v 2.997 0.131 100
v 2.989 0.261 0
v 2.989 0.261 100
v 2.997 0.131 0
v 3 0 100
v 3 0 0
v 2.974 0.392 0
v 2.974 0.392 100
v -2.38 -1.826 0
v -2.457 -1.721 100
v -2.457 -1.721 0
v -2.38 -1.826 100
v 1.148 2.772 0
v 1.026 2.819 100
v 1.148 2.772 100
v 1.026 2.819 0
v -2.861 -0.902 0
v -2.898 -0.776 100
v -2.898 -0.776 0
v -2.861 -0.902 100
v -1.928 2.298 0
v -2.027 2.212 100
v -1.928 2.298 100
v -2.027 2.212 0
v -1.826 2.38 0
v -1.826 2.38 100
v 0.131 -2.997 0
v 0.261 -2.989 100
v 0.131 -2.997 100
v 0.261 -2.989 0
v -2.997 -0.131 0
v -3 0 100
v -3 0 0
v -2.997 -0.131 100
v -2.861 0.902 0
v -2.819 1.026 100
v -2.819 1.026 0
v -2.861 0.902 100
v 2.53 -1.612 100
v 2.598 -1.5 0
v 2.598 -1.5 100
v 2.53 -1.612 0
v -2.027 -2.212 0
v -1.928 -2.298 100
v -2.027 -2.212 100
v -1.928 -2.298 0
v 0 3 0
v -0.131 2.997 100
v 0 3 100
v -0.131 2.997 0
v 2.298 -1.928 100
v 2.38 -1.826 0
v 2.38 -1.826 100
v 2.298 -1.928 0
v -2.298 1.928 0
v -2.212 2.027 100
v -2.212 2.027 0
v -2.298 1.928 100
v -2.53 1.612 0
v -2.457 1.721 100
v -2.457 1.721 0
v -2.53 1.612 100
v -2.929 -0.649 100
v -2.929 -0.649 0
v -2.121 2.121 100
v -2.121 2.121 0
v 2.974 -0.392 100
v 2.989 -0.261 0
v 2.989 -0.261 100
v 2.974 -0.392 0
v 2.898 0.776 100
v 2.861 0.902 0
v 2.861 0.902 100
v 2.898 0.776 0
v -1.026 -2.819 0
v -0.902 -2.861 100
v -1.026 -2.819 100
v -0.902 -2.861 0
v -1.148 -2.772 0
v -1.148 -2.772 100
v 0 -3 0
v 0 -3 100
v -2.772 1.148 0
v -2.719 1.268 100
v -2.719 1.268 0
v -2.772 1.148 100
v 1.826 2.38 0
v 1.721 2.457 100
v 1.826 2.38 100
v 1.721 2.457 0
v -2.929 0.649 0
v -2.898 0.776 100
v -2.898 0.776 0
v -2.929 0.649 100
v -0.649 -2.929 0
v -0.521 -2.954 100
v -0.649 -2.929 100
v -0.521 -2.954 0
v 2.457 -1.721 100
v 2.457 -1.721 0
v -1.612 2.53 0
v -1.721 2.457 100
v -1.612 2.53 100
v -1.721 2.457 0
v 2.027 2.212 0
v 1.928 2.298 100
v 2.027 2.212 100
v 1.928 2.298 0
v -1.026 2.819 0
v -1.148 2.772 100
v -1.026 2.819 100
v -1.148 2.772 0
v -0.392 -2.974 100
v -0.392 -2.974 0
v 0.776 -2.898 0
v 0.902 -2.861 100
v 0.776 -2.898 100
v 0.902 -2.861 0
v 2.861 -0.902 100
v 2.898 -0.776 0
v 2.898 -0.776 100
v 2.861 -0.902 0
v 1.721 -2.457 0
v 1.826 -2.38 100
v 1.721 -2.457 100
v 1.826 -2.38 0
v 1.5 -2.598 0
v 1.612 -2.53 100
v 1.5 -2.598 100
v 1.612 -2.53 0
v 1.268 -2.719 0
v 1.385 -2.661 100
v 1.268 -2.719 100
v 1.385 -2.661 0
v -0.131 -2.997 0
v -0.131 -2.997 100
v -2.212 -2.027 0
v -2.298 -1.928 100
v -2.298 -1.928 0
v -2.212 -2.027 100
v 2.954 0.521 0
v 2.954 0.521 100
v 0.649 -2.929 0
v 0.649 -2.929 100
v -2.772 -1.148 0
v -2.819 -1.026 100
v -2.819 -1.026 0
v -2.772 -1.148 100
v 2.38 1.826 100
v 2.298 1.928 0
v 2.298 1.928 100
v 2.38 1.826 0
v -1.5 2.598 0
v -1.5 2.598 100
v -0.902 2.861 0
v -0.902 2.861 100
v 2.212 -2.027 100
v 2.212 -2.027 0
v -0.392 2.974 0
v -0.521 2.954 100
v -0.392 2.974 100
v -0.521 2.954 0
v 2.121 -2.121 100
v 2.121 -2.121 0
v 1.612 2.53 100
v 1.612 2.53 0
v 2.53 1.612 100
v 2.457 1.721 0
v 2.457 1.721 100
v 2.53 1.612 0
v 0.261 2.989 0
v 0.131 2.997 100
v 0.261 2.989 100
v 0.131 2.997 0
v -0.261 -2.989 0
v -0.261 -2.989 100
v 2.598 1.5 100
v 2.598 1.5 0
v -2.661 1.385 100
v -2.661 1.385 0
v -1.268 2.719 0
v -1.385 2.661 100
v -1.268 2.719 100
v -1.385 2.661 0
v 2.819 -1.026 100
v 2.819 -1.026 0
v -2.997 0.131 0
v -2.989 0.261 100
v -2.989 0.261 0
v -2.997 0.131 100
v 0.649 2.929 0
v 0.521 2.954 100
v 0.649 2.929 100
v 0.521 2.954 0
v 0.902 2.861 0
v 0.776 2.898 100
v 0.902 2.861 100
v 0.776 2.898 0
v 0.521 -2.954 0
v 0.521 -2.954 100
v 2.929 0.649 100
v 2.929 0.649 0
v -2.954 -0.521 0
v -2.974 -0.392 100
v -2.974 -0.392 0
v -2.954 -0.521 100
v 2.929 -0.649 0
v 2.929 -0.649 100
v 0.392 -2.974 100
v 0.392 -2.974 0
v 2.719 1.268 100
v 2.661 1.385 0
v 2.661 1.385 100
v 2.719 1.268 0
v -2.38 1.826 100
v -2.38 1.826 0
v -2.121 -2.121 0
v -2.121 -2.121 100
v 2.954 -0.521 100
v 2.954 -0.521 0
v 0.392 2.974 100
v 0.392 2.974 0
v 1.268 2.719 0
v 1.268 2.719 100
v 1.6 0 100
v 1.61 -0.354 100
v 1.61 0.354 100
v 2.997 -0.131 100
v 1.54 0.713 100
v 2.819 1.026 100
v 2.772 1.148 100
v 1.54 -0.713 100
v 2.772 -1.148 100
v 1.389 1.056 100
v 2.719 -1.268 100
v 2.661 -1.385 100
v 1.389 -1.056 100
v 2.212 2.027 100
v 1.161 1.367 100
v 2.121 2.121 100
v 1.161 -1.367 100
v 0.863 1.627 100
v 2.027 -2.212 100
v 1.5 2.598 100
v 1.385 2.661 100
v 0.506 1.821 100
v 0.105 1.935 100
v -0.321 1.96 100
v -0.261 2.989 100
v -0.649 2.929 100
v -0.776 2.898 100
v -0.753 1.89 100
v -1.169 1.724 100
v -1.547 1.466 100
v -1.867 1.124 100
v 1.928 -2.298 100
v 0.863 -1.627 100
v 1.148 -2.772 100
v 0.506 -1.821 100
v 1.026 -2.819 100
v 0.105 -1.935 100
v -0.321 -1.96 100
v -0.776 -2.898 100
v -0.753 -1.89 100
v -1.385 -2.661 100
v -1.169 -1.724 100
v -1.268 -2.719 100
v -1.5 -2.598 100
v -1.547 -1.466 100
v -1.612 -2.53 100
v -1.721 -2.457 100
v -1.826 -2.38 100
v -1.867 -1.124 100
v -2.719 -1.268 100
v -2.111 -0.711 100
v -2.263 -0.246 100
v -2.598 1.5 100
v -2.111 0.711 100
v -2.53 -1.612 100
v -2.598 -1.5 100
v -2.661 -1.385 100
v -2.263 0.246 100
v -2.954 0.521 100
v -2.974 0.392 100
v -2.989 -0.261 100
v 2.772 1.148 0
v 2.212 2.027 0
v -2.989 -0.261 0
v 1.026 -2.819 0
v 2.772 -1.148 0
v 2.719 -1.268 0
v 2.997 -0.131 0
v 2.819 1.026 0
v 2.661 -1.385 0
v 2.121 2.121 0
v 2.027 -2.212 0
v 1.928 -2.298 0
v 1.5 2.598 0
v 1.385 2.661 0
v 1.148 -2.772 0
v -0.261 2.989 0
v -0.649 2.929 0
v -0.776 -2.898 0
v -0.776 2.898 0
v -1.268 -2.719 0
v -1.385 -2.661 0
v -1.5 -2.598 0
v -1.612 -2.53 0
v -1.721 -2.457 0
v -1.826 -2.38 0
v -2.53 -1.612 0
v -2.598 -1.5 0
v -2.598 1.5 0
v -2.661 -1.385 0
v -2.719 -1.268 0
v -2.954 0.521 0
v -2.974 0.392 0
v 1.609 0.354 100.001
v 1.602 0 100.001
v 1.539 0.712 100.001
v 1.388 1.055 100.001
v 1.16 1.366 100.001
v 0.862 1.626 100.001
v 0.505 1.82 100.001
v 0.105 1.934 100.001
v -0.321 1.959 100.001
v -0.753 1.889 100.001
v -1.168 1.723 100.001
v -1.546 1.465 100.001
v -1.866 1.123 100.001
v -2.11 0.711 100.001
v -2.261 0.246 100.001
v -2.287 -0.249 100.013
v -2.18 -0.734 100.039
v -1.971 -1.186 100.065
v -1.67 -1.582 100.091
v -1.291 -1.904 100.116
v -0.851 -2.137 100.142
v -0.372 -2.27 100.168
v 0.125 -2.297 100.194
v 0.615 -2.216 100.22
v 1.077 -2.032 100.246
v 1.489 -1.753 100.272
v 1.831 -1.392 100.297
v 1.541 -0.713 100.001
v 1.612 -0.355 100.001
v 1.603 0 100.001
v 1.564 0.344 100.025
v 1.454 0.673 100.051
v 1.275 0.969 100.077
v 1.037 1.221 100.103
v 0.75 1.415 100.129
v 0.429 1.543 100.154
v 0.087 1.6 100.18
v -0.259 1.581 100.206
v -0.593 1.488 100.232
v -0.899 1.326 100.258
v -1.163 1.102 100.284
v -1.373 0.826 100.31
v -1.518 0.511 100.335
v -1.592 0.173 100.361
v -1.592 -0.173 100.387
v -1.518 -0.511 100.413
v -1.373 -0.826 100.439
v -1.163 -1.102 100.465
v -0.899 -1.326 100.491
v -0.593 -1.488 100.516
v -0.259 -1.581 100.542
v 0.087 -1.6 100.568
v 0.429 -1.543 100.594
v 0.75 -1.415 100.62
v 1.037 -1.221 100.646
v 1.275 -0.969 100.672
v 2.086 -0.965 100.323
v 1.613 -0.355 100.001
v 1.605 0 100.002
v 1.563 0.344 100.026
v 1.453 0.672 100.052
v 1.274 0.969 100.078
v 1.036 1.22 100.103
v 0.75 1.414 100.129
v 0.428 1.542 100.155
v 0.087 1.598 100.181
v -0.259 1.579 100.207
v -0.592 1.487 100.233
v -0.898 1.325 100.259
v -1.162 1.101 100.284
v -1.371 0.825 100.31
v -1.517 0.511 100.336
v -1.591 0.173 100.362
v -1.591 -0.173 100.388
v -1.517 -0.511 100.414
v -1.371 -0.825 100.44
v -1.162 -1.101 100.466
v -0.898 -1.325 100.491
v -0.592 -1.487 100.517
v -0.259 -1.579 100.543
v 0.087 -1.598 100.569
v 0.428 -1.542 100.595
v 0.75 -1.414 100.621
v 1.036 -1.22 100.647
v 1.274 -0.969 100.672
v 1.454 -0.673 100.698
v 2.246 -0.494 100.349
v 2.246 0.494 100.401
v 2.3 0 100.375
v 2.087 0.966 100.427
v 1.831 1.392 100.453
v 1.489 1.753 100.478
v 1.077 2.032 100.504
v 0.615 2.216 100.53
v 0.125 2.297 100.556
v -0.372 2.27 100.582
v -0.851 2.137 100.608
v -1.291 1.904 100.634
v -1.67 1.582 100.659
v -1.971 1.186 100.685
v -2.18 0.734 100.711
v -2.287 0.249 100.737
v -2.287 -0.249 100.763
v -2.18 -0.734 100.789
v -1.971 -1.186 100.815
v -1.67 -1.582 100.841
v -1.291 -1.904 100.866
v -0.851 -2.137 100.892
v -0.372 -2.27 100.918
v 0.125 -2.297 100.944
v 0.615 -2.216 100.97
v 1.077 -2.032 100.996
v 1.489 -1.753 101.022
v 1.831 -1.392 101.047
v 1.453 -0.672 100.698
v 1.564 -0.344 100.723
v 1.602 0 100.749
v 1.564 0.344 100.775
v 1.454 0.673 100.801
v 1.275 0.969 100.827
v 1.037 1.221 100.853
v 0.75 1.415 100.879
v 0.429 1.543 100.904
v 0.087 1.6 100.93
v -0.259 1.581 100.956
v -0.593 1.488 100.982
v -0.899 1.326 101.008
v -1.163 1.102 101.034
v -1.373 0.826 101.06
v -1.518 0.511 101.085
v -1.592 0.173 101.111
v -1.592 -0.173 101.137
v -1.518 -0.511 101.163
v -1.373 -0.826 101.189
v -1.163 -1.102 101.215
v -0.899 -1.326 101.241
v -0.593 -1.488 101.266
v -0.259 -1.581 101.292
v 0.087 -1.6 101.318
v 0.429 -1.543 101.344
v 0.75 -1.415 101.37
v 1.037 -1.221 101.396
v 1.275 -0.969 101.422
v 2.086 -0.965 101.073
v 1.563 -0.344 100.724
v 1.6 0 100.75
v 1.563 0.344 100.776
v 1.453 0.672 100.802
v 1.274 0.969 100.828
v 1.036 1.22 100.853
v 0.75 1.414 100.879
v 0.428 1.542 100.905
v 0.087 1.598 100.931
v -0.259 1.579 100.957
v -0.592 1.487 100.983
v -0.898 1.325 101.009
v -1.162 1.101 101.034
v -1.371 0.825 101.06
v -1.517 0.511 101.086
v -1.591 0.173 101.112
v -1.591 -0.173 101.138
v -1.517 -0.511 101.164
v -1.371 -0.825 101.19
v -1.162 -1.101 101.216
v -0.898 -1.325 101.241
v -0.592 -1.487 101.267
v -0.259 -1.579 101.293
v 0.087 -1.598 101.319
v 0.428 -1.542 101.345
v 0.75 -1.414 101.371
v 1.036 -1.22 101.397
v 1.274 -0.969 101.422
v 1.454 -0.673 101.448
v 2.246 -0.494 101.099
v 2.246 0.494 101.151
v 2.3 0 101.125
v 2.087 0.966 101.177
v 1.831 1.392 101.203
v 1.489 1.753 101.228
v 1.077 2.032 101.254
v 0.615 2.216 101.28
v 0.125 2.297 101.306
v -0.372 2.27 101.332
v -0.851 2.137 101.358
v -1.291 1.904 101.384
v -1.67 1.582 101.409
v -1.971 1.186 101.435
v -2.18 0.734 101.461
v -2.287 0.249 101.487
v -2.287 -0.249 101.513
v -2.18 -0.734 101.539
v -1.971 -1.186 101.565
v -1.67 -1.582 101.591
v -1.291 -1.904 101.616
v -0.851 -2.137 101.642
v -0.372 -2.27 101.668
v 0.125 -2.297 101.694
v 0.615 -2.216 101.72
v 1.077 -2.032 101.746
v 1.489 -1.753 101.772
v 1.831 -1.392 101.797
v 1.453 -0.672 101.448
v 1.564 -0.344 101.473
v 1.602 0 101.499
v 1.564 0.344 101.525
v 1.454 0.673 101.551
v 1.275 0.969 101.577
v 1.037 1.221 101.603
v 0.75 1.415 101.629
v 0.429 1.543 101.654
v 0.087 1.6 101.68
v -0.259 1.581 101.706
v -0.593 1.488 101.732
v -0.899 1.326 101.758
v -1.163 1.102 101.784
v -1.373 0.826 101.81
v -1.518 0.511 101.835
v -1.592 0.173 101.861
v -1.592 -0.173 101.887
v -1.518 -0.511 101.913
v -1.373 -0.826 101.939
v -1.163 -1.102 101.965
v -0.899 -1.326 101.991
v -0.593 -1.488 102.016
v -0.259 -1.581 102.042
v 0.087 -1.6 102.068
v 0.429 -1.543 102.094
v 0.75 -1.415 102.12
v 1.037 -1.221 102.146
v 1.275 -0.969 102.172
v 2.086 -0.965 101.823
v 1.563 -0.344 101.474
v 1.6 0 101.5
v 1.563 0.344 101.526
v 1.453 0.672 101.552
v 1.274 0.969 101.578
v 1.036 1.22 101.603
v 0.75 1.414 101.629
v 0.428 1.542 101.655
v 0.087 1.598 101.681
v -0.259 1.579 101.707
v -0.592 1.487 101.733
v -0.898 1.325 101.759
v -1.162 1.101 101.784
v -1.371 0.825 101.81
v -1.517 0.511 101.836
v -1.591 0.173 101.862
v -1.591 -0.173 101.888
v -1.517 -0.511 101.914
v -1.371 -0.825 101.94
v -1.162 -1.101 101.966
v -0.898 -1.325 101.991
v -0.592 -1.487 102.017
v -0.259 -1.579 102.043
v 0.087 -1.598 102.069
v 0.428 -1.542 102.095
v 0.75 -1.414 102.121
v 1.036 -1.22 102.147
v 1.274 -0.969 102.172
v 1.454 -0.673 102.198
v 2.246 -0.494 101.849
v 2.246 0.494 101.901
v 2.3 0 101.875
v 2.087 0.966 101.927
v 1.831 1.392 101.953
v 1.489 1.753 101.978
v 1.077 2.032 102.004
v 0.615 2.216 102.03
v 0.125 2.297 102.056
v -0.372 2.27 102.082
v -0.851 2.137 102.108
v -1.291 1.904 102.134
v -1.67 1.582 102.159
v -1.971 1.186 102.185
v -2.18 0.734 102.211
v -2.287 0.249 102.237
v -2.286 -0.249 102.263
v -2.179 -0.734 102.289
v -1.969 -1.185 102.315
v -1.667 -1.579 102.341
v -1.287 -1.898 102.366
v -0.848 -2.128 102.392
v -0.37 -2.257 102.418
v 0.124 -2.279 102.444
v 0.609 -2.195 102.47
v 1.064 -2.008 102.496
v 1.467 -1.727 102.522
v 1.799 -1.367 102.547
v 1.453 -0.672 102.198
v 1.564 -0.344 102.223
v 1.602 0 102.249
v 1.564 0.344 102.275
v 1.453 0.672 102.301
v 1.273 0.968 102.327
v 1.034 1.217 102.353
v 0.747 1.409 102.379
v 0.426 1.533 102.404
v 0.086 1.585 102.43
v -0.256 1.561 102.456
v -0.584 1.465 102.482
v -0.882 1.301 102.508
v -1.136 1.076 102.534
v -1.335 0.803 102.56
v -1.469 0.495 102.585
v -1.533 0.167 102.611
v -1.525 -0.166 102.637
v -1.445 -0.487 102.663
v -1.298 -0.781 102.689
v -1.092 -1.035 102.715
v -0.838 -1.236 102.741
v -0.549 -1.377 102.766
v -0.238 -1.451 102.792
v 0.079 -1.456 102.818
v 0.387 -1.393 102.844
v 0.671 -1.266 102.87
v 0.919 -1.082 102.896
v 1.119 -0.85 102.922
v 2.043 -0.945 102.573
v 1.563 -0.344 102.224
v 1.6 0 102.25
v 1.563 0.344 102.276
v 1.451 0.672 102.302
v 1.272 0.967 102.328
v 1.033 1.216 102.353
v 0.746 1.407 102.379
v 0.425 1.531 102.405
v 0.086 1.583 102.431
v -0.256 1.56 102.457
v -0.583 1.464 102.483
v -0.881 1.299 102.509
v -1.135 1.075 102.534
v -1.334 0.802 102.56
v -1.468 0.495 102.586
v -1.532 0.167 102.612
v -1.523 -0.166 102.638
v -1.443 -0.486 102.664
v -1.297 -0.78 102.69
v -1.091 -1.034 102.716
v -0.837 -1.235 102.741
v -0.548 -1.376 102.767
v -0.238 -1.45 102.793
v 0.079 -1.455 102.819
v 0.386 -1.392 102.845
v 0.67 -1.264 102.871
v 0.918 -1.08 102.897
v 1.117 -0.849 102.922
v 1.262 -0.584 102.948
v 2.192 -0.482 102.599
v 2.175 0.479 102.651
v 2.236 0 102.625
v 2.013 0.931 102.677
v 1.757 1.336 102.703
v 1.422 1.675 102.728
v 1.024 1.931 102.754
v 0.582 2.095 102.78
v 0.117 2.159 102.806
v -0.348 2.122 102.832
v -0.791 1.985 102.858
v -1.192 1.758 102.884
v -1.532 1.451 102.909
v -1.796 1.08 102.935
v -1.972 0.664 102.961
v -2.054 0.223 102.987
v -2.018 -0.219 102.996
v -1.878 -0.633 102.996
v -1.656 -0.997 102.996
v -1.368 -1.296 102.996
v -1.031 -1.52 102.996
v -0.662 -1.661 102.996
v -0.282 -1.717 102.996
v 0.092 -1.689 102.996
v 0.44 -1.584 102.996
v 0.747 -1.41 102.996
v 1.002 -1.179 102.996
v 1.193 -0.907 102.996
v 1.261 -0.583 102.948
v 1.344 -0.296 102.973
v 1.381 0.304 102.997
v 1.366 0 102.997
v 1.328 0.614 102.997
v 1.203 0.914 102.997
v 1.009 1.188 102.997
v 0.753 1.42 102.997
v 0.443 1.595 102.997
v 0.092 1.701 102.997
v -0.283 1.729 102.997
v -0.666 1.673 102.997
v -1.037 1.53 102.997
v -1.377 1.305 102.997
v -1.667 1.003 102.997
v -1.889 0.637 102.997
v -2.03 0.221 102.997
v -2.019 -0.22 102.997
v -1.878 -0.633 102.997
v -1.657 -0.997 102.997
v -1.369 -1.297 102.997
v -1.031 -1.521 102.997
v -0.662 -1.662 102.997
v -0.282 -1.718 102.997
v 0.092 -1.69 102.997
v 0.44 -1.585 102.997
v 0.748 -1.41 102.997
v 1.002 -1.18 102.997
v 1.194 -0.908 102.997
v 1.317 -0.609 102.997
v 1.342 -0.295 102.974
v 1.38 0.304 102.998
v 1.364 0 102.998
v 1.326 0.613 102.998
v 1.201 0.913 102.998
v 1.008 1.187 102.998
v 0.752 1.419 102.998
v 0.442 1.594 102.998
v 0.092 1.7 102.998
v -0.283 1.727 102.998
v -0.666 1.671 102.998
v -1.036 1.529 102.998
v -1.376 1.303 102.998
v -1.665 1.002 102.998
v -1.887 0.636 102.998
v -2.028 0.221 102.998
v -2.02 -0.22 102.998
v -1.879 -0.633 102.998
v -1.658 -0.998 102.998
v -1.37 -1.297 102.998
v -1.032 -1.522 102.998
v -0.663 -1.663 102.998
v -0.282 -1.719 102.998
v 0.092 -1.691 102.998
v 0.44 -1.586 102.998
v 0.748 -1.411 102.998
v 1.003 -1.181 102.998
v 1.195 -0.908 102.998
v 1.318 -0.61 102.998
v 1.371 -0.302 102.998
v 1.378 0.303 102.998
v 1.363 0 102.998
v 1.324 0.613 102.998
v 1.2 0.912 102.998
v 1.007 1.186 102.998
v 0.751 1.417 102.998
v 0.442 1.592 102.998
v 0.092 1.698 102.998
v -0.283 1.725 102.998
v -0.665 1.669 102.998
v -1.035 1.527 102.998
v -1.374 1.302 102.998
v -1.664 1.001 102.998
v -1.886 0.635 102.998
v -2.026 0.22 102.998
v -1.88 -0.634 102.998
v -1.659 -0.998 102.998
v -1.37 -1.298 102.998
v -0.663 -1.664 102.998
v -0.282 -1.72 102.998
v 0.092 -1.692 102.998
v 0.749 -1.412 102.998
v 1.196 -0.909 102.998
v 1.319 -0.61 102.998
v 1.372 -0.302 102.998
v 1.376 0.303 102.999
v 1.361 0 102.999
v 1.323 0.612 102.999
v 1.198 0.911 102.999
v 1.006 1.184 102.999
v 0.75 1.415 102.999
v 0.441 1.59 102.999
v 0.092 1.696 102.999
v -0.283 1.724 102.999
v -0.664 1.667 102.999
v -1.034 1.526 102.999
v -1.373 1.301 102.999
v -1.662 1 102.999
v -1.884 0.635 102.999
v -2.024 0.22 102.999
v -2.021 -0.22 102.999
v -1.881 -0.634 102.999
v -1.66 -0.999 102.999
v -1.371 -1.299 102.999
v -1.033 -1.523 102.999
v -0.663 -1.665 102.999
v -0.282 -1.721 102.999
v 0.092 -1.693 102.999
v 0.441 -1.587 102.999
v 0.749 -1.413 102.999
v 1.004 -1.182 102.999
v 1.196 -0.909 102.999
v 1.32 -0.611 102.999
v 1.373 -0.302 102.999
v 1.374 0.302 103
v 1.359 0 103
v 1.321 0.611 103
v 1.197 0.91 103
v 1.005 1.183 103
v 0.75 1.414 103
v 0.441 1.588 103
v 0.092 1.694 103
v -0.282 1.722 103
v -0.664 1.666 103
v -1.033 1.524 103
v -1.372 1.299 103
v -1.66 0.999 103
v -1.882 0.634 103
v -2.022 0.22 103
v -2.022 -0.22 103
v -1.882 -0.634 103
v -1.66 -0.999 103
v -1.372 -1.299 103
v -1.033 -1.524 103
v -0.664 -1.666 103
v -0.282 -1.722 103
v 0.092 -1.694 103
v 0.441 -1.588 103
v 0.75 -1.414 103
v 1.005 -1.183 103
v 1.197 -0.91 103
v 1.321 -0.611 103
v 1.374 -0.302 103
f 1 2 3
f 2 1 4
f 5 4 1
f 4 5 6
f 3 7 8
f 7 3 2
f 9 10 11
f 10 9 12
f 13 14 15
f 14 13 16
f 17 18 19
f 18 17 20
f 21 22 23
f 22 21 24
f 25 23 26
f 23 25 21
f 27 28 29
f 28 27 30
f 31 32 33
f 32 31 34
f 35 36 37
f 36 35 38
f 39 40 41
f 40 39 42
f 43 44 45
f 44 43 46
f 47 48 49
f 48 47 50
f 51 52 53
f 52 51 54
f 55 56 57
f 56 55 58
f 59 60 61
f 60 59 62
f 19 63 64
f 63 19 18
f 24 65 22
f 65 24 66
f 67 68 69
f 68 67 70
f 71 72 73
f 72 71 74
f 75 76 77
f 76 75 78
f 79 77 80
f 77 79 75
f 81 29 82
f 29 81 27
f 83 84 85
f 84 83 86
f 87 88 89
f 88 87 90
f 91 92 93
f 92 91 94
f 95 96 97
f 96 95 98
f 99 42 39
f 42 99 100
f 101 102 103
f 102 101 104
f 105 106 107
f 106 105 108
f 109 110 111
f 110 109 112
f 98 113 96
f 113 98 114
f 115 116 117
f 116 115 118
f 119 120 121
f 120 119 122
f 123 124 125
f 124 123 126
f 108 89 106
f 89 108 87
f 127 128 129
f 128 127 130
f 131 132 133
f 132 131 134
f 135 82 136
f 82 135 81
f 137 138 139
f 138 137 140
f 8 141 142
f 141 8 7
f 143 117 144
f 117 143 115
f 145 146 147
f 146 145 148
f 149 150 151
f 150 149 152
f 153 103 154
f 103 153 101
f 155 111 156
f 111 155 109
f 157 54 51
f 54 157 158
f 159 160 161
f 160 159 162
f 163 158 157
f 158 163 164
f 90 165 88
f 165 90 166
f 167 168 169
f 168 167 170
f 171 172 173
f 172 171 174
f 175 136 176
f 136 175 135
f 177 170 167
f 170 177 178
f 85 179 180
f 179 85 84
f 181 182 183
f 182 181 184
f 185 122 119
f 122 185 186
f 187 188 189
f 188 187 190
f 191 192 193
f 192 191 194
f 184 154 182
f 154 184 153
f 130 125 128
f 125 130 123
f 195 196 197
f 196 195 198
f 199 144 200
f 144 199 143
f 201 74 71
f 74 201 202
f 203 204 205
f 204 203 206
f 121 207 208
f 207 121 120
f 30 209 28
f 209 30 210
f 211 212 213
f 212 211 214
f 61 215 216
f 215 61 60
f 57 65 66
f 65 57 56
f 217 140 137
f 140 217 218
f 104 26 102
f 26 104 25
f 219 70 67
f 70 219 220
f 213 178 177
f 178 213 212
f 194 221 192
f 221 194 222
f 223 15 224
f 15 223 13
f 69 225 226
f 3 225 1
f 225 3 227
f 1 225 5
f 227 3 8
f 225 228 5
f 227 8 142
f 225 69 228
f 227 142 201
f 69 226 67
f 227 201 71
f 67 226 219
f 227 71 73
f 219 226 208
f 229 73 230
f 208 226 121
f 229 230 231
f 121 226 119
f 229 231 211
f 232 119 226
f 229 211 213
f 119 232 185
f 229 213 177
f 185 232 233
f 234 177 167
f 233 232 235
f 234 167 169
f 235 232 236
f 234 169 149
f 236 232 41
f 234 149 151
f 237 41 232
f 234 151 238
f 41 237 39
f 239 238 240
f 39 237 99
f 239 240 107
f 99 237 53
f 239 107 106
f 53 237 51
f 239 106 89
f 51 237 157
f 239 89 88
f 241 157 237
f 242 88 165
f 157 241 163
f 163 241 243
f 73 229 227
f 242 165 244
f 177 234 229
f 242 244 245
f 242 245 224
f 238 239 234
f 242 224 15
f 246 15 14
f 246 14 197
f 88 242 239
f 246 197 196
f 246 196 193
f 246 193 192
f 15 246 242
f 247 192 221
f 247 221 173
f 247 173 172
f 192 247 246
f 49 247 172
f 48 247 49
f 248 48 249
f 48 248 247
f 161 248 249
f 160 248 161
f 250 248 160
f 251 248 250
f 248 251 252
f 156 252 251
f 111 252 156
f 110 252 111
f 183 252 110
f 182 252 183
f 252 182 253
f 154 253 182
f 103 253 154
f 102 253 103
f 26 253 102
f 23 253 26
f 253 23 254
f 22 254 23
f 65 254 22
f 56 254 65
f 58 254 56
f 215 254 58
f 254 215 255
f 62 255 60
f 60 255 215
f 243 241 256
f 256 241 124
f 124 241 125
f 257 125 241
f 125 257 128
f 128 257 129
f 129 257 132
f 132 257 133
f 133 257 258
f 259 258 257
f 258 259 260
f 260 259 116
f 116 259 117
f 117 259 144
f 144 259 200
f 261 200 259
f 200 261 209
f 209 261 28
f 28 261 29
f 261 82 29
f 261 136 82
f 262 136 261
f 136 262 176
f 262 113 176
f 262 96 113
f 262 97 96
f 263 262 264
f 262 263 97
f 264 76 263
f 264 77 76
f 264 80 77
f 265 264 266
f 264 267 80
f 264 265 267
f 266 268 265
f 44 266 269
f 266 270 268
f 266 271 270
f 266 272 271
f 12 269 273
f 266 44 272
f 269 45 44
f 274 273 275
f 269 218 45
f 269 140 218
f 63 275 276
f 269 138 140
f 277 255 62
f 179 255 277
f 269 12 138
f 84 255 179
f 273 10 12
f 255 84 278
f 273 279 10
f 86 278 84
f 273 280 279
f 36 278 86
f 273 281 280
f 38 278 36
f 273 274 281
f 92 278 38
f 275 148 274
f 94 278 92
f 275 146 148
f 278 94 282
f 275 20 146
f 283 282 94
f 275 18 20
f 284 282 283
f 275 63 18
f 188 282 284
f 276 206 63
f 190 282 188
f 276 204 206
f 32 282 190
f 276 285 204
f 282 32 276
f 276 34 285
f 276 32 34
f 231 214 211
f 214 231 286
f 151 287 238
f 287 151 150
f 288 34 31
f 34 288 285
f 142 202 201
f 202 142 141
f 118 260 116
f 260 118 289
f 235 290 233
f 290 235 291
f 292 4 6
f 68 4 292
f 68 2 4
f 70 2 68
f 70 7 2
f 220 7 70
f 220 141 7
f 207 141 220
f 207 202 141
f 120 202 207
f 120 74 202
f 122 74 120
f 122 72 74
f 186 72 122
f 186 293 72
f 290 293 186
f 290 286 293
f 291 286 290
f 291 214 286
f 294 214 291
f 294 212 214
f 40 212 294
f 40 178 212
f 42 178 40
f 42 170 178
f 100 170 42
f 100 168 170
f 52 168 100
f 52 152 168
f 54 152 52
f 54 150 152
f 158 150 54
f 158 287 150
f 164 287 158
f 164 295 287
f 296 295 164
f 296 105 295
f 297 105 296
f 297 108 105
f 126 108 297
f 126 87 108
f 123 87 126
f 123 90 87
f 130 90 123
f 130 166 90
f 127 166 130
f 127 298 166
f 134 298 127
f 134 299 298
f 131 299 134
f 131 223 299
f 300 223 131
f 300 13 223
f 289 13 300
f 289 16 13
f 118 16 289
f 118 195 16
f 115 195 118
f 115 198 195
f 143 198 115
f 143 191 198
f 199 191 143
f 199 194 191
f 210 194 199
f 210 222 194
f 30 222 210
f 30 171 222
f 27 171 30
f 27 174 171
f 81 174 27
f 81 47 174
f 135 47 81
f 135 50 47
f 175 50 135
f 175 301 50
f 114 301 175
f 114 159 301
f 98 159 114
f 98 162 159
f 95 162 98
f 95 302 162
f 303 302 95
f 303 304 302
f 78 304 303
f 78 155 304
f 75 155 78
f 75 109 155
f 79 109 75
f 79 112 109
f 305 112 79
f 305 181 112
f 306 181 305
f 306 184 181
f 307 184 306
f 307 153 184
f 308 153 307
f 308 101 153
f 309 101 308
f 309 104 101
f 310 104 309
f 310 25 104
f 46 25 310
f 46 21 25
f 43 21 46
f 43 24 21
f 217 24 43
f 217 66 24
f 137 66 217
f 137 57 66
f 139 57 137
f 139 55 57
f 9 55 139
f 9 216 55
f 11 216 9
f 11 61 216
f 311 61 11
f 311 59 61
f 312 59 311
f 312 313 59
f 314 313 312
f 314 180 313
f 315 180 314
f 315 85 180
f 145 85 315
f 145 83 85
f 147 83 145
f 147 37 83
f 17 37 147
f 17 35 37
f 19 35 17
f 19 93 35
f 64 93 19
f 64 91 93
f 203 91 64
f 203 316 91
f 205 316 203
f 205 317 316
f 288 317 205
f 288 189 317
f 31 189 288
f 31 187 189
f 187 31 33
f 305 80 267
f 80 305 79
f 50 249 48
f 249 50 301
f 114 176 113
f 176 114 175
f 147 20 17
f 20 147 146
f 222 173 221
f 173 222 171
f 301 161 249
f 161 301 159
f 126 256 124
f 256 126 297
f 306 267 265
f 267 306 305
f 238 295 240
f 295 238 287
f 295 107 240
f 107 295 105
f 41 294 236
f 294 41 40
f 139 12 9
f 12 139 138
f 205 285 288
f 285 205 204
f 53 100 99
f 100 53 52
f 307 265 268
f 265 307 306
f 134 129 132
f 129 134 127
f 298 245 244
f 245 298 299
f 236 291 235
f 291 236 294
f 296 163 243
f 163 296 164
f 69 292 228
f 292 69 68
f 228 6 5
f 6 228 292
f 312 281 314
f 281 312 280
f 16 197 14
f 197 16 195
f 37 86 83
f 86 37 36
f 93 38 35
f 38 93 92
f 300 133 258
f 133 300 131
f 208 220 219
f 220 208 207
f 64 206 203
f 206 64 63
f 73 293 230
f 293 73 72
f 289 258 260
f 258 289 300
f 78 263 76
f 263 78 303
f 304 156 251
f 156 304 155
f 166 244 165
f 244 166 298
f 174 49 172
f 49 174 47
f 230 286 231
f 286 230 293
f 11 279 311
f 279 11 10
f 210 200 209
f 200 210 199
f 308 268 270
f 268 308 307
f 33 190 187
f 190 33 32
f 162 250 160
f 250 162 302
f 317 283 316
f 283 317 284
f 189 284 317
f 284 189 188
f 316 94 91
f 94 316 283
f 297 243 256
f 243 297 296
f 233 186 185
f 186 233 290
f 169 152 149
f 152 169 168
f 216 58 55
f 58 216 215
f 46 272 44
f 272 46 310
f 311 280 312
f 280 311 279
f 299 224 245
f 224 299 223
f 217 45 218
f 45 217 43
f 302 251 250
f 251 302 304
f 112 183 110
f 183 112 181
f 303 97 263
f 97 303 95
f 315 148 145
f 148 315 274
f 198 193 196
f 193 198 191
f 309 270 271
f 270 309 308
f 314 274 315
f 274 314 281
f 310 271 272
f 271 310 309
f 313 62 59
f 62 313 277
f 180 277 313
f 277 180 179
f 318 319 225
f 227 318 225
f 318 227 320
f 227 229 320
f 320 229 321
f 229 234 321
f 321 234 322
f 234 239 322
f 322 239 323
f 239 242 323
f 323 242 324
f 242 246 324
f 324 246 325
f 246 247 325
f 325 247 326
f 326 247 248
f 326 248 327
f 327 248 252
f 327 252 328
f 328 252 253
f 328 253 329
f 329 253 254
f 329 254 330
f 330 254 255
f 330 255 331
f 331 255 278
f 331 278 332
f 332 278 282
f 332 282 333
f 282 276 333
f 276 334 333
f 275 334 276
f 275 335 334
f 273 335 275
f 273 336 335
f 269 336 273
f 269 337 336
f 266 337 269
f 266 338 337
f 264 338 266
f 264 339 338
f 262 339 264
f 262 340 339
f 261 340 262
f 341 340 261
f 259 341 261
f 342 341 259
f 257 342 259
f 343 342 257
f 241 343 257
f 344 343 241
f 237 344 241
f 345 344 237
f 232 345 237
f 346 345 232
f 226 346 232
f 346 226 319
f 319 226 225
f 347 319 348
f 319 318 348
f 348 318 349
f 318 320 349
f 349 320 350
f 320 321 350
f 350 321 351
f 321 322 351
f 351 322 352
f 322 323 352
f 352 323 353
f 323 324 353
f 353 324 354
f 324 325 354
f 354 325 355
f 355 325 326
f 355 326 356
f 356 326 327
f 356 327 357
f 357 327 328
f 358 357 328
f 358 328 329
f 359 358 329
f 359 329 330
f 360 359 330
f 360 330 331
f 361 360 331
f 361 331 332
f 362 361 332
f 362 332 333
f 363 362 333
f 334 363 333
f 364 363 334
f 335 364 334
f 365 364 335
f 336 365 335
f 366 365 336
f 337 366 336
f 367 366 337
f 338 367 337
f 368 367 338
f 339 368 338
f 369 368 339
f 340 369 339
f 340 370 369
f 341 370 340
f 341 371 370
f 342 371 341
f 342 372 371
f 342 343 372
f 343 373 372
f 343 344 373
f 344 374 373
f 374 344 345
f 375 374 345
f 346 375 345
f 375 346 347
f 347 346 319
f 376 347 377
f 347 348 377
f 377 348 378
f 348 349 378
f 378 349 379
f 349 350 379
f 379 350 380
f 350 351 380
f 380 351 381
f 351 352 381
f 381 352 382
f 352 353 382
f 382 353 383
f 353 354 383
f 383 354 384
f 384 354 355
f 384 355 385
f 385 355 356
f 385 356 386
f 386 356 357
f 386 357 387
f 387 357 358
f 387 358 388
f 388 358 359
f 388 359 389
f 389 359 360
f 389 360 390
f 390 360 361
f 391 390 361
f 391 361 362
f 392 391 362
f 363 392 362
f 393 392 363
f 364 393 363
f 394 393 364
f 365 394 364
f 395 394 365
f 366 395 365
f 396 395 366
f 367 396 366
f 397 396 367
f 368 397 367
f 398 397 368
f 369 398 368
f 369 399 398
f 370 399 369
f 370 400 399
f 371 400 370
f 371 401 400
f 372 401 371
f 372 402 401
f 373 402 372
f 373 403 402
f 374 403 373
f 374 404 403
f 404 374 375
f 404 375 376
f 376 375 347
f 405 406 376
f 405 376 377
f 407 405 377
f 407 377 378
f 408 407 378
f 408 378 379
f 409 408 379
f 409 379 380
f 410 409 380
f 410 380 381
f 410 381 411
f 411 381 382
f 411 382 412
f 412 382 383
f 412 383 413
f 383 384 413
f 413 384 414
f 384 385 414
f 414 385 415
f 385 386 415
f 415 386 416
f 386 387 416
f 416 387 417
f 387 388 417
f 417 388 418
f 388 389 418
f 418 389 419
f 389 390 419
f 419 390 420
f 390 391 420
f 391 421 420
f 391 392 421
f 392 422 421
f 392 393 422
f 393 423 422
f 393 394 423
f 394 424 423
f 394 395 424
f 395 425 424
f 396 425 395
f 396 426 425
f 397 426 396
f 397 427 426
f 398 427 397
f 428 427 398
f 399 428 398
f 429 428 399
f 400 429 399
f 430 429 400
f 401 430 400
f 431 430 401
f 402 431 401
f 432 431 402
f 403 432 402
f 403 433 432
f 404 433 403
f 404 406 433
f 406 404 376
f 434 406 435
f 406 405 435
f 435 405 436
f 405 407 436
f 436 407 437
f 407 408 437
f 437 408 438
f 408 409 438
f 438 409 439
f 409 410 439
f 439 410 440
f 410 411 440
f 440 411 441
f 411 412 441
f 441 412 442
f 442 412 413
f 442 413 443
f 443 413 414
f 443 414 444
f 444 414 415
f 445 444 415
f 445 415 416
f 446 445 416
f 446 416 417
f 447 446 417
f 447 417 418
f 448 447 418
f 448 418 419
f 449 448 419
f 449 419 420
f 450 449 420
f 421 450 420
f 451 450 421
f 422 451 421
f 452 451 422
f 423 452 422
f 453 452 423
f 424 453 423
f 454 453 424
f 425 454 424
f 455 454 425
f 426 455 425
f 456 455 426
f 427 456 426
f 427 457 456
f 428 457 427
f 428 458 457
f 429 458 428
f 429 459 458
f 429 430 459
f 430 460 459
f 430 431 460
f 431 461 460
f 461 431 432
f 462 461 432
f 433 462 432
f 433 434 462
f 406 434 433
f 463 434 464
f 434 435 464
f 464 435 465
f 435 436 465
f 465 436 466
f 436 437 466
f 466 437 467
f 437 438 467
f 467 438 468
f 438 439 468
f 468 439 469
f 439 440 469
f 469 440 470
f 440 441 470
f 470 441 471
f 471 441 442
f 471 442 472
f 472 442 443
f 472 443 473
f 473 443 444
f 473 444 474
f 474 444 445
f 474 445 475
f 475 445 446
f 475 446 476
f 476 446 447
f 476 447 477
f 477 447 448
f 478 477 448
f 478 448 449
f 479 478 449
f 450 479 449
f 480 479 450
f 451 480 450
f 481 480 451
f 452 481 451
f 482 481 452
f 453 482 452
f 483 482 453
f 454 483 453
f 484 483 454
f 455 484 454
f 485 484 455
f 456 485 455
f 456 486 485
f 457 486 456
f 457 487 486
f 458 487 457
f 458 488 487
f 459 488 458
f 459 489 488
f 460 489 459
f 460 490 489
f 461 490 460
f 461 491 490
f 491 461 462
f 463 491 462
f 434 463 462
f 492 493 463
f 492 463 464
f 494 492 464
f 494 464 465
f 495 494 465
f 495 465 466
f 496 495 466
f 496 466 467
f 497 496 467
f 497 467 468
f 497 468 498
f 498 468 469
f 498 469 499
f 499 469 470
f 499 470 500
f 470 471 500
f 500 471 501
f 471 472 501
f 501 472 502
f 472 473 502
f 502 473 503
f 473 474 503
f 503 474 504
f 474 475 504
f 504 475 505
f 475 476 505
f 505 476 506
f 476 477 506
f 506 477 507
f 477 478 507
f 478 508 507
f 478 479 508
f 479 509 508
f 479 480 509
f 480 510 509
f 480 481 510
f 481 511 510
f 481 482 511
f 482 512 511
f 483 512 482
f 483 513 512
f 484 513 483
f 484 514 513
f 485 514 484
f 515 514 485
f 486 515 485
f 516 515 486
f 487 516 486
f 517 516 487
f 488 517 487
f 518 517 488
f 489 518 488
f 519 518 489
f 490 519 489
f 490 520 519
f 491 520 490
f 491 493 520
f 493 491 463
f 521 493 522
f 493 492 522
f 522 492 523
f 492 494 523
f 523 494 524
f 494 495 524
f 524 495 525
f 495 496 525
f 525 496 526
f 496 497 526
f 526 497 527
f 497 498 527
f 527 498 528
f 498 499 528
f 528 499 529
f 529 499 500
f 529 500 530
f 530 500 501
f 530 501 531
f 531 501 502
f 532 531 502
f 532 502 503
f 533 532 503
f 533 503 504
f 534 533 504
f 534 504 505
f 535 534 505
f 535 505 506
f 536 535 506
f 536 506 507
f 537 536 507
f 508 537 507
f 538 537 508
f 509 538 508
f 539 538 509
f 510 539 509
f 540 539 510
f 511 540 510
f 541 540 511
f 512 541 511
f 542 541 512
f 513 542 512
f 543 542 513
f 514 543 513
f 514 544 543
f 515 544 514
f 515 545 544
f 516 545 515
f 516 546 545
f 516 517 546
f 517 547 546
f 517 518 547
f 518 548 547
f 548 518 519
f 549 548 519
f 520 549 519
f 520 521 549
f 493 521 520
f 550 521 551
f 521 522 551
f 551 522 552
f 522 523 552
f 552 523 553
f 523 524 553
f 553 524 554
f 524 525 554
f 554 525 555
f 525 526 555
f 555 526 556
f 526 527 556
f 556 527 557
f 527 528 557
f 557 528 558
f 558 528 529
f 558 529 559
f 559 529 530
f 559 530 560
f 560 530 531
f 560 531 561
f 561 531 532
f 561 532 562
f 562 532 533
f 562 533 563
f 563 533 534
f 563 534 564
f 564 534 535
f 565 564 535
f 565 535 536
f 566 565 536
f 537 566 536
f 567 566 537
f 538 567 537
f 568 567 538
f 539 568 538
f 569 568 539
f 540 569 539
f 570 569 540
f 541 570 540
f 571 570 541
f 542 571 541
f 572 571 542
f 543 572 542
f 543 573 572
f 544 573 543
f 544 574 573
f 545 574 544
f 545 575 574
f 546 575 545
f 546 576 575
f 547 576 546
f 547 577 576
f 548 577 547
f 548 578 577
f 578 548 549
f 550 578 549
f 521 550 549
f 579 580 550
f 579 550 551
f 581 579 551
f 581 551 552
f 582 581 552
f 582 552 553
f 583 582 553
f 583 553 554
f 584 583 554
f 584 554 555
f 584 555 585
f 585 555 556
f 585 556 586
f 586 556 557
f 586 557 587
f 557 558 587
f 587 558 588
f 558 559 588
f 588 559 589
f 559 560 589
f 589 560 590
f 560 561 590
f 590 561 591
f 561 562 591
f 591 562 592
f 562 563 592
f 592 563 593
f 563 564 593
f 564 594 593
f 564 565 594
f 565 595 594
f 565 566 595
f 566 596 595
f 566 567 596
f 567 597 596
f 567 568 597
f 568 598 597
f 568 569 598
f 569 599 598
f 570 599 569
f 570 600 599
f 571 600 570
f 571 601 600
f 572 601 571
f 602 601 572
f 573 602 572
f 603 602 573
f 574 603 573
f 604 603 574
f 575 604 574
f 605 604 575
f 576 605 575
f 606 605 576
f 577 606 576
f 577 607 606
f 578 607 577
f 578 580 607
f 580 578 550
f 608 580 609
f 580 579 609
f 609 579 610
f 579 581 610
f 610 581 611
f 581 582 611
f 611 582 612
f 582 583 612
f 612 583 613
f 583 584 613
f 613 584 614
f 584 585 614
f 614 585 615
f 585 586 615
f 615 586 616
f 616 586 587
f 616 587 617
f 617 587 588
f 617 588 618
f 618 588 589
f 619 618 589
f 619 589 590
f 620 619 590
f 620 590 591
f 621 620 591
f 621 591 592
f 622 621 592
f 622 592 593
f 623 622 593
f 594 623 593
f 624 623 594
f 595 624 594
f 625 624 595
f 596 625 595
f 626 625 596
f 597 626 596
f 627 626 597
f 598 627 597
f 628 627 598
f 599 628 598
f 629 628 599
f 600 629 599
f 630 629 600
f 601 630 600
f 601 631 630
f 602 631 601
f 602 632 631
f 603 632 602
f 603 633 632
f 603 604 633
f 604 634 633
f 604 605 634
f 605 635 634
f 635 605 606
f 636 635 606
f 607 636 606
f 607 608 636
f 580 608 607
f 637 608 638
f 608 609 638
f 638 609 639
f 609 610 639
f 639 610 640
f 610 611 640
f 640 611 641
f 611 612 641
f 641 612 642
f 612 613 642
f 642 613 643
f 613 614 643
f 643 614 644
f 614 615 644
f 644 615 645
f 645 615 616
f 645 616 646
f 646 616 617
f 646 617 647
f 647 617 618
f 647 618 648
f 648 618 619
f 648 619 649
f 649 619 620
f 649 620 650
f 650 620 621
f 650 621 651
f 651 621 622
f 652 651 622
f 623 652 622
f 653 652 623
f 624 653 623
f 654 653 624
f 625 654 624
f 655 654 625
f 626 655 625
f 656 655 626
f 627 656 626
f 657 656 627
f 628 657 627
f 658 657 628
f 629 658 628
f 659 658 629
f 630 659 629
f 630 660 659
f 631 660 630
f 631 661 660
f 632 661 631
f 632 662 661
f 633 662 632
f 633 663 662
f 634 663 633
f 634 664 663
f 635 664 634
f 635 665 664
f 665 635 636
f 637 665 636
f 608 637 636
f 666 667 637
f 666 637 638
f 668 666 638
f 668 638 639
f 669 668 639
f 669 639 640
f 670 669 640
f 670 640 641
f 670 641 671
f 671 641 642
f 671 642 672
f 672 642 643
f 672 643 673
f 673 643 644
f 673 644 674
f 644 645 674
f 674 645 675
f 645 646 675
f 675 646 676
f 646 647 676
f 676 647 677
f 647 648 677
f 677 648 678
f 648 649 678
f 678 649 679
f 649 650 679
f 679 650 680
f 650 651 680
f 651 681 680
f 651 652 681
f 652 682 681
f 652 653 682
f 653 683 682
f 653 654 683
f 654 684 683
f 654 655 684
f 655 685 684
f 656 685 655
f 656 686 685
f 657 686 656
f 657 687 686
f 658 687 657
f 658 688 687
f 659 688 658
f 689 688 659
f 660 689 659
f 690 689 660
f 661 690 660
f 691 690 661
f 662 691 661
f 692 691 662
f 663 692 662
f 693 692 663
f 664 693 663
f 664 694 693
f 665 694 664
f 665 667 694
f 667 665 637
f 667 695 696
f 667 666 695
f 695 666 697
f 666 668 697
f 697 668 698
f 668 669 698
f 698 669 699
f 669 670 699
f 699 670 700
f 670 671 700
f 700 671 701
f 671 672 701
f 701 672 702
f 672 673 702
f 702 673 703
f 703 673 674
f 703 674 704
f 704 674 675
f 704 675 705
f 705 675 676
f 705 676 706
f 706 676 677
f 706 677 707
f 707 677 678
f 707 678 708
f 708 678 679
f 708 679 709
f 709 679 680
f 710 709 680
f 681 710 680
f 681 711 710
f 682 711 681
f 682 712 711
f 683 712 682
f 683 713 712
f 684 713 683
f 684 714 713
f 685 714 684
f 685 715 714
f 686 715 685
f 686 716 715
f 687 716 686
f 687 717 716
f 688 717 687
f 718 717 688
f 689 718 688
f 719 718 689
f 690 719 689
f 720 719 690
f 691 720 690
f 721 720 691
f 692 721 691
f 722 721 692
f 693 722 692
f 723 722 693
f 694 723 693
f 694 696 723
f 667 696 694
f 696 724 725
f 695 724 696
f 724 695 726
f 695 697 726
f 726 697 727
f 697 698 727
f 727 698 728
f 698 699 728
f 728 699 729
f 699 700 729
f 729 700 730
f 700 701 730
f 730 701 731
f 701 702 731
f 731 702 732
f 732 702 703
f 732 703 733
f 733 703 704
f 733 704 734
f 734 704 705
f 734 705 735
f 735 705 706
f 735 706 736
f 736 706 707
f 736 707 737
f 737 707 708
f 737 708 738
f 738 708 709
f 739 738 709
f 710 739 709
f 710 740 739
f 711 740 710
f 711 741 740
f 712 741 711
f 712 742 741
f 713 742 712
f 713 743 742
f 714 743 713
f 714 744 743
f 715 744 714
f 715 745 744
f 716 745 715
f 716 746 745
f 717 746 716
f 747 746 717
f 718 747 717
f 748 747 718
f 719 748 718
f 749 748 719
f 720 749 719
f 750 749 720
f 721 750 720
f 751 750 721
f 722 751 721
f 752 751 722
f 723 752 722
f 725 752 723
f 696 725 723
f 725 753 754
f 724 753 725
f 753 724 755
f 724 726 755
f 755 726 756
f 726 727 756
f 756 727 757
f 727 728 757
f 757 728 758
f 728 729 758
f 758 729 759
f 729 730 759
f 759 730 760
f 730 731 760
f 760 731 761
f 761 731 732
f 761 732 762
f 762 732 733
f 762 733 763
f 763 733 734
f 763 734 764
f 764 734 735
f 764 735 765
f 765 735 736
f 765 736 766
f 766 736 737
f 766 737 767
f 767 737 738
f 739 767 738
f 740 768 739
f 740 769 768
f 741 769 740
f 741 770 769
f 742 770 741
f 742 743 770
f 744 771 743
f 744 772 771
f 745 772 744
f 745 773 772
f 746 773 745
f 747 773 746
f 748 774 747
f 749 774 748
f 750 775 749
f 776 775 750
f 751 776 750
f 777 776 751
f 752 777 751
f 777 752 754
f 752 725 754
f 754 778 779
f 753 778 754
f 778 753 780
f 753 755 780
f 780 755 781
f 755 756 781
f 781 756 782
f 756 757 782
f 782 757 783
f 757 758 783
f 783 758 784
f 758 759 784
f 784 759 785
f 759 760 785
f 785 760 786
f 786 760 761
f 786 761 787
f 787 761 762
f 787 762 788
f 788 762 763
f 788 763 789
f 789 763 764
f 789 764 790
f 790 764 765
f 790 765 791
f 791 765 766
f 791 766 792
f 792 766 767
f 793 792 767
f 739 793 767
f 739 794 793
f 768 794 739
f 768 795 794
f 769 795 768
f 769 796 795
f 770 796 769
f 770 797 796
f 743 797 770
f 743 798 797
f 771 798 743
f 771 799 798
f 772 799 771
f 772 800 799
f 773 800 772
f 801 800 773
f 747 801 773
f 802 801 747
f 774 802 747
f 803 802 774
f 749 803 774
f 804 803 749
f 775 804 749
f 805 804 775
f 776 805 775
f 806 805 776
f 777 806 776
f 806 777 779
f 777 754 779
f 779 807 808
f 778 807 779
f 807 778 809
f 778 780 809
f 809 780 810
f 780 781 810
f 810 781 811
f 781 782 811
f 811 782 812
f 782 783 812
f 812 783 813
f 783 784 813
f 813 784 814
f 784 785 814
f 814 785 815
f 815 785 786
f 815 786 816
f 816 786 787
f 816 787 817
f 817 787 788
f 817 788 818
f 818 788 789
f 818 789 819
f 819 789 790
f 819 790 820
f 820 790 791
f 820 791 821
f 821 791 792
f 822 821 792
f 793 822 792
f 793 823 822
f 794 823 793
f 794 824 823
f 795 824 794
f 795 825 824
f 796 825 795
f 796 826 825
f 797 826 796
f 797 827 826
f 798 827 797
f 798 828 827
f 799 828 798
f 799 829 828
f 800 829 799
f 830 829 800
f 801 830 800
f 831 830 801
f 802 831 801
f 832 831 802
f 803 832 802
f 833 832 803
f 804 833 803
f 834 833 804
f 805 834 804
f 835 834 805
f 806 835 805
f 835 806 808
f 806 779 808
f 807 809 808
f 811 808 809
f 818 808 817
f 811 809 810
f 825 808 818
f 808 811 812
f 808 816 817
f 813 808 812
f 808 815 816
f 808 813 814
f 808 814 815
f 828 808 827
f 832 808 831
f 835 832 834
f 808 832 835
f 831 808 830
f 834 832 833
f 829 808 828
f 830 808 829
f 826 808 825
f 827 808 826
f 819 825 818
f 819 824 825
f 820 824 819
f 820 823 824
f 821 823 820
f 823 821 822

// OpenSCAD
// Created 2016-2017 by Ryan A. Colyer.
// This work is released with CC0 into the public domain.
// https://creativecommons.org/publicdomain/zero/1.0/
//
// https://www.thingiverse.com/thing:1686322
//
// v2.1

$fn = 100;

screw_resolution = 0.5;  // in mm

// Legs
leg_diameter = 6;
leg_height = 100;

// Provides standard metric thread pitches.
function ThreadPitch(diameter) =
  (diameter <= 64) ?
    lookup(diameter, [
      [2, 0.4],
      [2.5, 0.45],
      [3, 0.5],
      [4, 0.7],
      [5, 0.8],
      [6, 1.0],
      [7, 1.0],
      [8, 1.25],
      [10, 1.5],
      [12, 1.75],
      [14, 2.0],
      [16, 2.0],
      [18, 2.5],
      [20, 2.5],
      [22, 2.5],
      [24, 3.0],
      [27, 3.0],
      [30, 3.5],
      [33, 3.5],
      [36, 4.0],
      [39, 4.0],
      [42, 4.5],
      [48, 5.0],
      [52, 5.0],
      [56, 5.5],
      [60, 5.5],
      [64, 6.0]
    ]) :
    diameter * 6.0 / 64;


// This generates a closed polyhedron from an array of arrays of points,
// with each inner array tracing out one loop outlining the polyhedron.
// pointarrays should contain an array of N arrays each of size P outlining a
// closed manifold.  The points must obey the right-hand rule.  For example,
// looking down, the P points in the inner arrays are counter-clockwise in a
// loop, while the N point arrays increase in height.  Points in each inner
// array do not need to be equal height, but they usually should not meet or
// cross the line segments from the adjacent points in the other arrays.
// (N>=2, P>=3)
// Core triangles:
//   [j][i], [j+1][i], [j+1][(i+1)%P]
//   [j][i], [j+1][(i+1)%P], [j][(i+1)%P]
//   Then triangles are formed in a loop with the middle point of the first
//   and last array.
module ClosePoints(pointarrays) {
  function recurse_avg(arr, n=0, p=[0,0,0]) = (n>=len(arr)) ? p :
    recurse_avg(arr, n+1, p+(arr[n]-p)/(n+1));

  N = len(pointarrays);
  P = len(pointarrays[0]);
  NP = N*P;
  lastarr = pointarrays[N-1];
  midbot = recurse_avg(pointarrays[0]);
  midtop = recurse_avg(pointarrays[N-1]);

  faces_bot = [
    for (i=[0:P-1])
      [0,i+1,1+(i+1)%len(pointarrays[0])]
  ];

  loop_offset = 1;
  bot_len = loop_offset + P;

  faces_loop = [
    for (j=[0:N-2], i=[0:P-1], t=[0:1])
      [loop_offset, loop_offset, loop_offset] + (t==0 ?
      [j*P+i, (j+1)*P+i, (j+1)*P+(i+1)%P] :
      [j*P+i, (j+1)*P+(i+1)%P, j*P+(i+1)%P])
  ];

  top_offset = loop_offset + NP - P;
  midtop_offset = top_offset + P;

  faces_top = [
    for (i=[0:P-1])
      [midtop_offset,top_offset+(i+1)%P,top_offset+i]
  ];

  points = [
    for (i=[-1:NP])
      (i<0) ? midbot :
      ((i==NP) ? midtop :
      pointarrays[floor(i/P)][i%P])
  ];
  faces = concat(faces_bot, faces_loop, faces_top);

  polyhedron(points=points, faces=faces);
}

// This creates a vertical rod at the origin with external threads.  It uses
// metric standards by default.
module ScrewThread(outer_diam, height, pitch=0, tooth_angle=30, tolerance=0.4, tip_height=0, tooth_height=0, tip_min_fract=0) {

  pitch = (pitch==0) ? ThreadPitch(outer_diam) : pitch;
  tooth_height = (tooth_height==0) ? pitch : tooth_height;
  tip_min_fract = (tip_min_fract<0) ? 0 :
    ((tip_min_fract>0.9999) ? 0.9999 : tip_min_fract);

  outer_diam_cor = outer_diam + 0.25*tolerance; // Plastic shrinkage correction
  inner_diam = outer_diam - tooth_height/tan(tooth_angle);
  or = (outer_diam_cor < screw_resolution) ?
    screw_resolution/2 : outer_diam_cor / 2;
  ir = (inner_diam < screw_resolution) ? screw_resolution/2 : inner_diam / 2;
  height = (height < screw_resolution) ? screw_resolution : height;

  steps_per_loop_try = ceil(2*3.14159265359*or / screw_resolution);
  steps_per_loop = (steps_per_loop_try < 4) ? 4 : steps_per_loop_try;
  hs_ext = 3;
  hsteps = ceil(3 * height / pitch) + 2*hs_ext;

  extent = or - ir;

  tip_start = height-tip_height;
  tip_height_sc = tip_height / (1-tip_min_fract);

  tip_height_ir = (tip_height_sc > tooth_height/2) ?
    tip_height_sc - tooth_height/2 : tip_height_sc;

  tip_height_w = (tip_height_sc > tooth_height) ? tooth_height : tip_height_sc;
  tip_wstart = height + tip_height_sc - tip_height - tip_height_w;


  function tooth_width(a, h, pitch, tooth_height, extent) =
    let(
      ang_full = h*360.0/pitch-a,
      ang_pn = atan2(sin(ang_full), cos(ang_full)),
      ang = ang_pn < 0 ? ang_pn+360 : ang_pn,
      frac = ang/360,
      tfrac_half = tooth_height / (2*pitch),
      tfrac_cut = 2*tfrac_half
    )
    (frac > tfrac_cut) ? 0 : (
      (frac <= tfrac_half) ?
        ((frac / tfrac_half) * extent) :
        ((1 - (frac - tfrac_half)/tfrac_half) * extent)
    );


  pointarrays = [
    for (hs=[0:hsteps])
      [
        for (s=[0:steps_per_loop-1])
          let(
            ang_full = s*360.0/steps_per_loop,
            ang_pn = atan2(sin(ang_full), cos(ang_full)),
            ang = ang_pn < 0 ? ang_pn+360 : ang_pn,

            h_fudge = pitch*0.001,

            h_mod =
              (hs%3 == 2) ?
                ((s == steps_per_loop-1) ? tooth_height - h_fudge : (
                 (s == steps_per_loop-2) ? tooth_height/2 : 0)) : (
              (hs%3 == 0) ?
                ((s == steps_per_loop-1) ? pitch-tooth_height/2 : (
                 (s == steps_per_loop-2) ? pitch-tooth_height + h_fudge : 0)) :
                ((s == steps_per_loop-1) ? pitch-tooth_height/2 + h_fudge : (
                 (s == steps_per_loop-2) ? tooth_height/2 : 0))
              ),

            h_level =
              (hs%3 == 2) ? tooth_height - h_fudge : (
              (hs%3 == 0) ? 0 : tooth_height/2),

            h_ub = floor((hs-hs_ext)/3) * pitch
              + h_level + ang*pitch/360.0 - h_mod,
            h_max = height - (hsteps-hs) * h_fudge,
            h_min = hs * h_fudge,
            h = (h_ub < h_min) ? h_min : ((h_ub > h_max) ? h_max : h_ub),

            ht = h - tip_start,
            hf_ir = ht/tip_height_ir,
            ht_w = h - tip_wstart,
            hf_w_t = ht_w/tip_height_w,
            hf_w = (hf_w_t < 0) ? 0 : ((hf_w_t > 1) ? 1 : hf_w_t),

            ext_tip = (h <= tip_wstart) ? extent : (1-hf_w) * extent,
            wnormal = tooth_width(ang, h, pitch, tooth_height, ext_tip),
            w = (h <= tip_wstart) ? wnormal :
              (1-hf_w) * wnormal +
              hf_w * (0.1*screw_resolution + (wnormal * wnormal * wnormal /
                (ext_tip*ext_tip+0.1*screw_resolution))),
            r = (ht <= 0) ? ir + w :
              ( (ht < tip_height_ir ? ((2/(1+(hf_ir*hf_ir))-1) * ir) : 0) + w)
          )
          [r*cos(ang), r*sin(ang), h]
      ]
  ];


  ClosePoints(pointarrays);
}

// Solid rod on the bottom, external threads on the top.
module RodStart(height, diameter, thread_len=0, thread_diam=0, thread_pitch=0) {
  // A reasonable default.
  thread_diam = (thread_diam==0) ? 0.75*diameter : thread_diam;
  thread_len = (thread_len==0) ? 0.5*diameter : thread_len;
  thread_pitch = (thread_pitch==0) ? ThreadPitch(thread_diam) : thread_pitch;

  cylinder(r=diameter/2, h=height, $fn=24*diameter);

  translate([0, 0, height])
    ScrewThread(thread_diam, thread_len, thread_pitch,
      tip_height=thread_pitch, tip_min_fract=0.75);
}

// Legs
module leg() {
  RodStart(leg_height, leg_diameter);
}

// Render
leg();
